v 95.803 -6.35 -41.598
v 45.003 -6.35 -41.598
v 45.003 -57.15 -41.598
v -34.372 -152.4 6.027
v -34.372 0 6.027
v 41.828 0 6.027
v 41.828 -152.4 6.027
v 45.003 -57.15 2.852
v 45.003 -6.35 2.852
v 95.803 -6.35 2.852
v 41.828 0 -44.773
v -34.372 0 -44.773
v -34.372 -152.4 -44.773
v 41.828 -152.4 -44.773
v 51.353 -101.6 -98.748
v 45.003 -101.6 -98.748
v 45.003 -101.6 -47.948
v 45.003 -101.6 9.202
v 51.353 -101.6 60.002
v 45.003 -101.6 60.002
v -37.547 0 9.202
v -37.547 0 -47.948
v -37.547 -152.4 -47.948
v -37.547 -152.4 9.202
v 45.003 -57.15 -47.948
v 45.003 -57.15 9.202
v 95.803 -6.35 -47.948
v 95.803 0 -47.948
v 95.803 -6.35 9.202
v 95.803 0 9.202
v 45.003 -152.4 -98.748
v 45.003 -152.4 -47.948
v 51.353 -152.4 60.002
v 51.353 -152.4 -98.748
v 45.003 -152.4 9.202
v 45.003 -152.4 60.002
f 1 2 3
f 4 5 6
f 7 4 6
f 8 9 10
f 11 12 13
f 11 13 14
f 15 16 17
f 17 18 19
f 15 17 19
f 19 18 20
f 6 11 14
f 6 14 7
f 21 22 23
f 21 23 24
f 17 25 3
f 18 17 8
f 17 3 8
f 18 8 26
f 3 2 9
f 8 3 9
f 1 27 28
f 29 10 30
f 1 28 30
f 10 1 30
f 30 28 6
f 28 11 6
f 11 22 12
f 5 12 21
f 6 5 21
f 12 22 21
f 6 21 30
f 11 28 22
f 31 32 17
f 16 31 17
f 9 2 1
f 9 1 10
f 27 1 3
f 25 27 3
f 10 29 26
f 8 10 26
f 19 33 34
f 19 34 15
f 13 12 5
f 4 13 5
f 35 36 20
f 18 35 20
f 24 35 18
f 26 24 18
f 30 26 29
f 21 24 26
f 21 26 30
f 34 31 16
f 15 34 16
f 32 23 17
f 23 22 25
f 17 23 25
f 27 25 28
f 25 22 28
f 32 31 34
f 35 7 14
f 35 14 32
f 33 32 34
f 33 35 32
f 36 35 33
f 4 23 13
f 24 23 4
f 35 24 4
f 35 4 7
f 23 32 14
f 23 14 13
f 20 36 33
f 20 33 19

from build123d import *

# Parameters (mm, degrees)
F0_W     = 82.55
F0_H     = 57.15
F0_W_2   = 76.2
F0_H_2   = 50.8
F1_DEPTH = 152.4
F2_W     = 6.35
F2_H     = 57.15
F3_DEPTH = 50.8
F4_W     = 50.8
F4_H     = 6.35
F5_DEPTH = 50.8
F7_DEPTH = 118.618
F8_W     = 50.8
F8_H     = 158.75
F9_DEPTH = 6.35


with BuildPart() as f1:
    # F0 (on Front) → F1 (new body)
    with BuildSketch(Plane.XZ):
        with Locations((3.728271, -19.37303)):
            Rectangle(F0_W, F0_H)
        with Locations((3.728271, -19.37303)):
            Rectangle(F0_W_2, F0_H_2, mode=Mode.SUBTRACT)
    extrude(amount=F1_DEPTH)

    # F2 (on face) → F3 (join)
    with BuildSketch(Plane.YZ.offset(45.003271)):
        with Locations((-3.175, -19.37303)):
            Rectangle(F2_W, F2_H)
    extrude(amount=F3_DEPTH)

    # F4 (on face) → F5 (join)
    with BuildSketch(Plane.XZ.offset(6.35)):
        with Locations((70.403271, -44.77303)):
            Rectangle(F4_W, F4_H)
        with Locations((70.403271, 6.02697)):
            Rectangle(F4_W, F4_H)
    extrude(amount=F5_DEPTH)

    # F6 (on face) → F7 (cut)
    with BuildSketch(Plane.XY.offset(9.20197)):
        Polygon((95.803271, -6.35), (45.003271, -57.15), (95.803271, -57.15), align=None)
    extrude(amount=-F7_DEPTH, mode=Mode.SUBTRACT)

    # F8 (on face) → F9 (join)
    with BuildSketch(Plane.YZ.offset(45.003271)):
        with Locations((-127, -19.37303)):
            Rectangle(F8_W, F8_H)
    extrude(amount=F9_DEPTH)


solid = f1.part
